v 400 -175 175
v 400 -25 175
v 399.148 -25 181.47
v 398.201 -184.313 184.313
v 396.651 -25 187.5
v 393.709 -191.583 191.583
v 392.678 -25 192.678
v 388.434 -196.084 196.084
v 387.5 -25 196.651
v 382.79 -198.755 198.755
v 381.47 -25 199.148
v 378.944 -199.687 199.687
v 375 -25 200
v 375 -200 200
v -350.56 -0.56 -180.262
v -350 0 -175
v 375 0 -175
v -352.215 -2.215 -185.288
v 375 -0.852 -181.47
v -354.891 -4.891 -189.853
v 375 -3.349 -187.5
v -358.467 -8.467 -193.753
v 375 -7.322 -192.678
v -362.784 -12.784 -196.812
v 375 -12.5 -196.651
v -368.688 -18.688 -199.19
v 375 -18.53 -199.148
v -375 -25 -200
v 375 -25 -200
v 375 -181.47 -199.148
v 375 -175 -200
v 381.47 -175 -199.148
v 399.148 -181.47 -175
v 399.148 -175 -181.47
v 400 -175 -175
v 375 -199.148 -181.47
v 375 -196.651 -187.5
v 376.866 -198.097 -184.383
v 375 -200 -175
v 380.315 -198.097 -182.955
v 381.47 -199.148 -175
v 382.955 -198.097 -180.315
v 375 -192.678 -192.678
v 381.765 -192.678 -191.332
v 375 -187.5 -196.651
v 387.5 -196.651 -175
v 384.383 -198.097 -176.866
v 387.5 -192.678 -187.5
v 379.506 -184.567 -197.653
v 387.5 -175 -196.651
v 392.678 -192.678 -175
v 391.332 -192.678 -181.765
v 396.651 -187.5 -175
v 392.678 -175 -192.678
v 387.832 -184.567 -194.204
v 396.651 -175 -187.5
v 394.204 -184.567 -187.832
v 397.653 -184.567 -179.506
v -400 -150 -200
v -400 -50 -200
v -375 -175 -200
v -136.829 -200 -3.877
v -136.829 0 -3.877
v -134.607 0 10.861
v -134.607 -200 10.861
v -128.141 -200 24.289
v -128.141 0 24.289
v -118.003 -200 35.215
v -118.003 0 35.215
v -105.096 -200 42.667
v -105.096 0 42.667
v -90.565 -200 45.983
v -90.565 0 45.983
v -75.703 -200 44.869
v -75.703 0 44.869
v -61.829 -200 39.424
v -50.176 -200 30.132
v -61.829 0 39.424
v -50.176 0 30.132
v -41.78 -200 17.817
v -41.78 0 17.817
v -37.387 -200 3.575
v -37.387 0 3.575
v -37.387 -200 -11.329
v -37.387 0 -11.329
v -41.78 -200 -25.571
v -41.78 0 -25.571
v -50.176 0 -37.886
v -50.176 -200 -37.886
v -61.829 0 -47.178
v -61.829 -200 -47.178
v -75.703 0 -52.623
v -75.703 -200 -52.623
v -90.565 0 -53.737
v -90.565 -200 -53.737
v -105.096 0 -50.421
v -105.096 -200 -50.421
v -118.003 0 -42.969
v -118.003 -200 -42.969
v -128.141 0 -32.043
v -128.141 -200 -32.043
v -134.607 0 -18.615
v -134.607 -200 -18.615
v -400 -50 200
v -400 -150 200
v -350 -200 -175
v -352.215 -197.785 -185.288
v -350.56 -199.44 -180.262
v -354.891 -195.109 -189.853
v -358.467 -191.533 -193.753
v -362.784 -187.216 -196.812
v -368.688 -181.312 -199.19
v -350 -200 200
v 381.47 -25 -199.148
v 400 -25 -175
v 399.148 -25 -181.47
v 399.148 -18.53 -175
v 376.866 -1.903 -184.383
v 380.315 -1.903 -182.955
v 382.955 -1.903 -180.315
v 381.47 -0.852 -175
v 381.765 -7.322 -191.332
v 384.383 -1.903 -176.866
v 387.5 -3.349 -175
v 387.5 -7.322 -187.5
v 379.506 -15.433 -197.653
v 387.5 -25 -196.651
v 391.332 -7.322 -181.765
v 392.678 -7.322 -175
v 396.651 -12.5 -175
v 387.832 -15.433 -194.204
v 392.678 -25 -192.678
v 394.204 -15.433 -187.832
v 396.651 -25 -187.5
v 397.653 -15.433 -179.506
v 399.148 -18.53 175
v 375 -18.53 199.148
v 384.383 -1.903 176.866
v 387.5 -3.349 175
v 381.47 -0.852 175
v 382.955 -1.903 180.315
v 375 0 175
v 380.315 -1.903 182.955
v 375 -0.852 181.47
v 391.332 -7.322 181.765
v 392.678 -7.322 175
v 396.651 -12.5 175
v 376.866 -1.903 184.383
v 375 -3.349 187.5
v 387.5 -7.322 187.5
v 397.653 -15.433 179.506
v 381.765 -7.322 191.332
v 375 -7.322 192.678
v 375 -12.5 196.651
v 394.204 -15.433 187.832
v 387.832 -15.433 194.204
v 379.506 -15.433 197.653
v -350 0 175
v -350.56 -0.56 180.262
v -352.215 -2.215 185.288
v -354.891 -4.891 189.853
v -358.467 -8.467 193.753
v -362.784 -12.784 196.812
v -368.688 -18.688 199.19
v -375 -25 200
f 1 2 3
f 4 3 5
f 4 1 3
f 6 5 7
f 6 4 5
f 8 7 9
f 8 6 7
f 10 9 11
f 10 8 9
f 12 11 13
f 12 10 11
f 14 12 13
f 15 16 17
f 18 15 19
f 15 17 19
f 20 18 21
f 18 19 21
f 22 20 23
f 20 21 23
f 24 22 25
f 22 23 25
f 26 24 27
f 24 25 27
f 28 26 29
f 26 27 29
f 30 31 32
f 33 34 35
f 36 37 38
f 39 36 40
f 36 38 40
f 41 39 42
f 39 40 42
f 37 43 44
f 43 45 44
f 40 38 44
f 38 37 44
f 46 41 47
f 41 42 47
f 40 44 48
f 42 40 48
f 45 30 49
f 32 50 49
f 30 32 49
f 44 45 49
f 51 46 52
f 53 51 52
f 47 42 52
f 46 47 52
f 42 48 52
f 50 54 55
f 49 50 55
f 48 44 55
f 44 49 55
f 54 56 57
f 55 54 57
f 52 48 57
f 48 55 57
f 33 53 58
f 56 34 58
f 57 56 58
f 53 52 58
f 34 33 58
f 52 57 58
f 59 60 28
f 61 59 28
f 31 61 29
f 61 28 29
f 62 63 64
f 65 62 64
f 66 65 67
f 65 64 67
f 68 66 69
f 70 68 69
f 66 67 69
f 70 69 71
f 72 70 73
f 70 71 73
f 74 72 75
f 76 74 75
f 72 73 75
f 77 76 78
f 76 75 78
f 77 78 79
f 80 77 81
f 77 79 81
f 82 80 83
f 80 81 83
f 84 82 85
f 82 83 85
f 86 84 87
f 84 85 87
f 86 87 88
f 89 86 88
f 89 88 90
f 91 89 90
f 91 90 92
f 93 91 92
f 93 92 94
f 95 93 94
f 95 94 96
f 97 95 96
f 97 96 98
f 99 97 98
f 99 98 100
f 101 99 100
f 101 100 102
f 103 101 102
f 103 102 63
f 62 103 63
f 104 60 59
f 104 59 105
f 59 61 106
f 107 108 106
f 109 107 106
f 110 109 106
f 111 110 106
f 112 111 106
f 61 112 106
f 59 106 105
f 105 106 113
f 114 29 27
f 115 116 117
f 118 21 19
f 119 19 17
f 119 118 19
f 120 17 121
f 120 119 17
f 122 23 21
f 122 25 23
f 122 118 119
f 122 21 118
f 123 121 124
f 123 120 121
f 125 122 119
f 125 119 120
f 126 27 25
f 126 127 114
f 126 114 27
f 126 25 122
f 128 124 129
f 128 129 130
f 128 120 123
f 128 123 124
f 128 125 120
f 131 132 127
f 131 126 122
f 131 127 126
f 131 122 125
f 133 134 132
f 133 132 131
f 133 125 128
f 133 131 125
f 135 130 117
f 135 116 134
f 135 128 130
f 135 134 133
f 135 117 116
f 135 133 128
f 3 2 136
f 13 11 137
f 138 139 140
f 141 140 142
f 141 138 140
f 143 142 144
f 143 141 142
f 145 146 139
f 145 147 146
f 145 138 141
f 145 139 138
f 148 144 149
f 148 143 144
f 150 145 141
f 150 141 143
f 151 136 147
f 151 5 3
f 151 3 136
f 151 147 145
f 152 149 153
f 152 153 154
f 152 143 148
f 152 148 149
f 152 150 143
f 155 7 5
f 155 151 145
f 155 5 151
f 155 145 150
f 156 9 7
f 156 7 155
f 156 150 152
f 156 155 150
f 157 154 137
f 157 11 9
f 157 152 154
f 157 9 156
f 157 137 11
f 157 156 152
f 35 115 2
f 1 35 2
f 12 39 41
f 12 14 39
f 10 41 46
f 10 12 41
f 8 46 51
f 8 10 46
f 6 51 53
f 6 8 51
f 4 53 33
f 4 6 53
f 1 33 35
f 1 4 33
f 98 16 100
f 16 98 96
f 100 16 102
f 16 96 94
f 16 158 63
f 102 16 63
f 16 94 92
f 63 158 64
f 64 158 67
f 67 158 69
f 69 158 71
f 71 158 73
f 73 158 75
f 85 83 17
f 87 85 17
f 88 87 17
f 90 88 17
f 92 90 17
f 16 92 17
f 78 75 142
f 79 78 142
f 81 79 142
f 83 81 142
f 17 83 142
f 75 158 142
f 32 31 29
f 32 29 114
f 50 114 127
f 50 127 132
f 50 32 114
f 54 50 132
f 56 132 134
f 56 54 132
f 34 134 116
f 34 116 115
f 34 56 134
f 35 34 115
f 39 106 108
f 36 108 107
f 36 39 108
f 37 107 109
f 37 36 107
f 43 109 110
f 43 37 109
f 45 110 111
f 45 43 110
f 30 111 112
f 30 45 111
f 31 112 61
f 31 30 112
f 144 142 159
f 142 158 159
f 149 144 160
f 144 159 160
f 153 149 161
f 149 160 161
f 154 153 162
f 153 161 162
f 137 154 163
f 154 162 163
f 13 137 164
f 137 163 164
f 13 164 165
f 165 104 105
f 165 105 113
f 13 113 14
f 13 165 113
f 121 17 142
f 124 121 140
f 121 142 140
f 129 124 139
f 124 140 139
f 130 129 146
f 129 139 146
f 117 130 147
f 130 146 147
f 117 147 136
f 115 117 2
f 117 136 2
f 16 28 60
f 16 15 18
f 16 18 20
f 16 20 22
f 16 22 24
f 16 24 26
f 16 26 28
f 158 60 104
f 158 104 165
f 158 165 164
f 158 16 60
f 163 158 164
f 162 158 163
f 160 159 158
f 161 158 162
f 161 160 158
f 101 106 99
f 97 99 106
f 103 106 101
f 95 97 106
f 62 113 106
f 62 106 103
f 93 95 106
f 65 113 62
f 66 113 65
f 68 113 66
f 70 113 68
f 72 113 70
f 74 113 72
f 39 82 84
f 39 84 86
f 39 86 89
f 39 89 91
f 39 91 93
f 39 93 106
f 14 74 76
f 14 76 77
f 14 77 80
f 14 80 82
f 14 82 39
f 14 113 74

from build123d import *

# Parameters (mm, degrees)
F0_W     = 800
F0_H     = 400
F1_DEPTH = 200
F2_SIZE  = 50
F3_R     = 25
F4_R     = 25
F5_R     = 25
F7_D     = 100


with BuildPart() as f1:
    # F0 (on Front) → F1 (new body)
    with BuildSketch(Plane.XZ):
        Rectangle(F0_W, F0_H)
    extrude(amount=F1_DEPTH)

    # F2
    f2_edges = [f1.edges().sort_by_distance(p)[0] for p in [
        (-400, -200, 0),
        (-400, 0, 0),
    ]]
    chamfer(f2_edges, length=F2_SIZE)

    # F3
    f3_edges = [f1.edges().sort_by_distance(p)[0] for p in [
        (400, -100, -200),
    ]]
    fillet(f3_edges, radius=F3_R)

    # F4
    f4_edges = [f1.edges().sort_by_distance(p)[0] for p in [
        (400, -100, 200),
        (400, -200, 12.5),
    ]]
    fillet(f4_edges, radius=F4_R)

    # F5
    f5_edges = [f1.edges().sort_by_distance(p)[0] for p in [
        (400, 0, 0),
    ]]
    fillet(f5_edges, radius=F5_R)

    # F7 (through all)
    with Locations(Plane.XZ.offset(200)):
        with Locations((-86.828791, -3.877041)):
            Hole(F7_D / 2)


solid = f1.part
